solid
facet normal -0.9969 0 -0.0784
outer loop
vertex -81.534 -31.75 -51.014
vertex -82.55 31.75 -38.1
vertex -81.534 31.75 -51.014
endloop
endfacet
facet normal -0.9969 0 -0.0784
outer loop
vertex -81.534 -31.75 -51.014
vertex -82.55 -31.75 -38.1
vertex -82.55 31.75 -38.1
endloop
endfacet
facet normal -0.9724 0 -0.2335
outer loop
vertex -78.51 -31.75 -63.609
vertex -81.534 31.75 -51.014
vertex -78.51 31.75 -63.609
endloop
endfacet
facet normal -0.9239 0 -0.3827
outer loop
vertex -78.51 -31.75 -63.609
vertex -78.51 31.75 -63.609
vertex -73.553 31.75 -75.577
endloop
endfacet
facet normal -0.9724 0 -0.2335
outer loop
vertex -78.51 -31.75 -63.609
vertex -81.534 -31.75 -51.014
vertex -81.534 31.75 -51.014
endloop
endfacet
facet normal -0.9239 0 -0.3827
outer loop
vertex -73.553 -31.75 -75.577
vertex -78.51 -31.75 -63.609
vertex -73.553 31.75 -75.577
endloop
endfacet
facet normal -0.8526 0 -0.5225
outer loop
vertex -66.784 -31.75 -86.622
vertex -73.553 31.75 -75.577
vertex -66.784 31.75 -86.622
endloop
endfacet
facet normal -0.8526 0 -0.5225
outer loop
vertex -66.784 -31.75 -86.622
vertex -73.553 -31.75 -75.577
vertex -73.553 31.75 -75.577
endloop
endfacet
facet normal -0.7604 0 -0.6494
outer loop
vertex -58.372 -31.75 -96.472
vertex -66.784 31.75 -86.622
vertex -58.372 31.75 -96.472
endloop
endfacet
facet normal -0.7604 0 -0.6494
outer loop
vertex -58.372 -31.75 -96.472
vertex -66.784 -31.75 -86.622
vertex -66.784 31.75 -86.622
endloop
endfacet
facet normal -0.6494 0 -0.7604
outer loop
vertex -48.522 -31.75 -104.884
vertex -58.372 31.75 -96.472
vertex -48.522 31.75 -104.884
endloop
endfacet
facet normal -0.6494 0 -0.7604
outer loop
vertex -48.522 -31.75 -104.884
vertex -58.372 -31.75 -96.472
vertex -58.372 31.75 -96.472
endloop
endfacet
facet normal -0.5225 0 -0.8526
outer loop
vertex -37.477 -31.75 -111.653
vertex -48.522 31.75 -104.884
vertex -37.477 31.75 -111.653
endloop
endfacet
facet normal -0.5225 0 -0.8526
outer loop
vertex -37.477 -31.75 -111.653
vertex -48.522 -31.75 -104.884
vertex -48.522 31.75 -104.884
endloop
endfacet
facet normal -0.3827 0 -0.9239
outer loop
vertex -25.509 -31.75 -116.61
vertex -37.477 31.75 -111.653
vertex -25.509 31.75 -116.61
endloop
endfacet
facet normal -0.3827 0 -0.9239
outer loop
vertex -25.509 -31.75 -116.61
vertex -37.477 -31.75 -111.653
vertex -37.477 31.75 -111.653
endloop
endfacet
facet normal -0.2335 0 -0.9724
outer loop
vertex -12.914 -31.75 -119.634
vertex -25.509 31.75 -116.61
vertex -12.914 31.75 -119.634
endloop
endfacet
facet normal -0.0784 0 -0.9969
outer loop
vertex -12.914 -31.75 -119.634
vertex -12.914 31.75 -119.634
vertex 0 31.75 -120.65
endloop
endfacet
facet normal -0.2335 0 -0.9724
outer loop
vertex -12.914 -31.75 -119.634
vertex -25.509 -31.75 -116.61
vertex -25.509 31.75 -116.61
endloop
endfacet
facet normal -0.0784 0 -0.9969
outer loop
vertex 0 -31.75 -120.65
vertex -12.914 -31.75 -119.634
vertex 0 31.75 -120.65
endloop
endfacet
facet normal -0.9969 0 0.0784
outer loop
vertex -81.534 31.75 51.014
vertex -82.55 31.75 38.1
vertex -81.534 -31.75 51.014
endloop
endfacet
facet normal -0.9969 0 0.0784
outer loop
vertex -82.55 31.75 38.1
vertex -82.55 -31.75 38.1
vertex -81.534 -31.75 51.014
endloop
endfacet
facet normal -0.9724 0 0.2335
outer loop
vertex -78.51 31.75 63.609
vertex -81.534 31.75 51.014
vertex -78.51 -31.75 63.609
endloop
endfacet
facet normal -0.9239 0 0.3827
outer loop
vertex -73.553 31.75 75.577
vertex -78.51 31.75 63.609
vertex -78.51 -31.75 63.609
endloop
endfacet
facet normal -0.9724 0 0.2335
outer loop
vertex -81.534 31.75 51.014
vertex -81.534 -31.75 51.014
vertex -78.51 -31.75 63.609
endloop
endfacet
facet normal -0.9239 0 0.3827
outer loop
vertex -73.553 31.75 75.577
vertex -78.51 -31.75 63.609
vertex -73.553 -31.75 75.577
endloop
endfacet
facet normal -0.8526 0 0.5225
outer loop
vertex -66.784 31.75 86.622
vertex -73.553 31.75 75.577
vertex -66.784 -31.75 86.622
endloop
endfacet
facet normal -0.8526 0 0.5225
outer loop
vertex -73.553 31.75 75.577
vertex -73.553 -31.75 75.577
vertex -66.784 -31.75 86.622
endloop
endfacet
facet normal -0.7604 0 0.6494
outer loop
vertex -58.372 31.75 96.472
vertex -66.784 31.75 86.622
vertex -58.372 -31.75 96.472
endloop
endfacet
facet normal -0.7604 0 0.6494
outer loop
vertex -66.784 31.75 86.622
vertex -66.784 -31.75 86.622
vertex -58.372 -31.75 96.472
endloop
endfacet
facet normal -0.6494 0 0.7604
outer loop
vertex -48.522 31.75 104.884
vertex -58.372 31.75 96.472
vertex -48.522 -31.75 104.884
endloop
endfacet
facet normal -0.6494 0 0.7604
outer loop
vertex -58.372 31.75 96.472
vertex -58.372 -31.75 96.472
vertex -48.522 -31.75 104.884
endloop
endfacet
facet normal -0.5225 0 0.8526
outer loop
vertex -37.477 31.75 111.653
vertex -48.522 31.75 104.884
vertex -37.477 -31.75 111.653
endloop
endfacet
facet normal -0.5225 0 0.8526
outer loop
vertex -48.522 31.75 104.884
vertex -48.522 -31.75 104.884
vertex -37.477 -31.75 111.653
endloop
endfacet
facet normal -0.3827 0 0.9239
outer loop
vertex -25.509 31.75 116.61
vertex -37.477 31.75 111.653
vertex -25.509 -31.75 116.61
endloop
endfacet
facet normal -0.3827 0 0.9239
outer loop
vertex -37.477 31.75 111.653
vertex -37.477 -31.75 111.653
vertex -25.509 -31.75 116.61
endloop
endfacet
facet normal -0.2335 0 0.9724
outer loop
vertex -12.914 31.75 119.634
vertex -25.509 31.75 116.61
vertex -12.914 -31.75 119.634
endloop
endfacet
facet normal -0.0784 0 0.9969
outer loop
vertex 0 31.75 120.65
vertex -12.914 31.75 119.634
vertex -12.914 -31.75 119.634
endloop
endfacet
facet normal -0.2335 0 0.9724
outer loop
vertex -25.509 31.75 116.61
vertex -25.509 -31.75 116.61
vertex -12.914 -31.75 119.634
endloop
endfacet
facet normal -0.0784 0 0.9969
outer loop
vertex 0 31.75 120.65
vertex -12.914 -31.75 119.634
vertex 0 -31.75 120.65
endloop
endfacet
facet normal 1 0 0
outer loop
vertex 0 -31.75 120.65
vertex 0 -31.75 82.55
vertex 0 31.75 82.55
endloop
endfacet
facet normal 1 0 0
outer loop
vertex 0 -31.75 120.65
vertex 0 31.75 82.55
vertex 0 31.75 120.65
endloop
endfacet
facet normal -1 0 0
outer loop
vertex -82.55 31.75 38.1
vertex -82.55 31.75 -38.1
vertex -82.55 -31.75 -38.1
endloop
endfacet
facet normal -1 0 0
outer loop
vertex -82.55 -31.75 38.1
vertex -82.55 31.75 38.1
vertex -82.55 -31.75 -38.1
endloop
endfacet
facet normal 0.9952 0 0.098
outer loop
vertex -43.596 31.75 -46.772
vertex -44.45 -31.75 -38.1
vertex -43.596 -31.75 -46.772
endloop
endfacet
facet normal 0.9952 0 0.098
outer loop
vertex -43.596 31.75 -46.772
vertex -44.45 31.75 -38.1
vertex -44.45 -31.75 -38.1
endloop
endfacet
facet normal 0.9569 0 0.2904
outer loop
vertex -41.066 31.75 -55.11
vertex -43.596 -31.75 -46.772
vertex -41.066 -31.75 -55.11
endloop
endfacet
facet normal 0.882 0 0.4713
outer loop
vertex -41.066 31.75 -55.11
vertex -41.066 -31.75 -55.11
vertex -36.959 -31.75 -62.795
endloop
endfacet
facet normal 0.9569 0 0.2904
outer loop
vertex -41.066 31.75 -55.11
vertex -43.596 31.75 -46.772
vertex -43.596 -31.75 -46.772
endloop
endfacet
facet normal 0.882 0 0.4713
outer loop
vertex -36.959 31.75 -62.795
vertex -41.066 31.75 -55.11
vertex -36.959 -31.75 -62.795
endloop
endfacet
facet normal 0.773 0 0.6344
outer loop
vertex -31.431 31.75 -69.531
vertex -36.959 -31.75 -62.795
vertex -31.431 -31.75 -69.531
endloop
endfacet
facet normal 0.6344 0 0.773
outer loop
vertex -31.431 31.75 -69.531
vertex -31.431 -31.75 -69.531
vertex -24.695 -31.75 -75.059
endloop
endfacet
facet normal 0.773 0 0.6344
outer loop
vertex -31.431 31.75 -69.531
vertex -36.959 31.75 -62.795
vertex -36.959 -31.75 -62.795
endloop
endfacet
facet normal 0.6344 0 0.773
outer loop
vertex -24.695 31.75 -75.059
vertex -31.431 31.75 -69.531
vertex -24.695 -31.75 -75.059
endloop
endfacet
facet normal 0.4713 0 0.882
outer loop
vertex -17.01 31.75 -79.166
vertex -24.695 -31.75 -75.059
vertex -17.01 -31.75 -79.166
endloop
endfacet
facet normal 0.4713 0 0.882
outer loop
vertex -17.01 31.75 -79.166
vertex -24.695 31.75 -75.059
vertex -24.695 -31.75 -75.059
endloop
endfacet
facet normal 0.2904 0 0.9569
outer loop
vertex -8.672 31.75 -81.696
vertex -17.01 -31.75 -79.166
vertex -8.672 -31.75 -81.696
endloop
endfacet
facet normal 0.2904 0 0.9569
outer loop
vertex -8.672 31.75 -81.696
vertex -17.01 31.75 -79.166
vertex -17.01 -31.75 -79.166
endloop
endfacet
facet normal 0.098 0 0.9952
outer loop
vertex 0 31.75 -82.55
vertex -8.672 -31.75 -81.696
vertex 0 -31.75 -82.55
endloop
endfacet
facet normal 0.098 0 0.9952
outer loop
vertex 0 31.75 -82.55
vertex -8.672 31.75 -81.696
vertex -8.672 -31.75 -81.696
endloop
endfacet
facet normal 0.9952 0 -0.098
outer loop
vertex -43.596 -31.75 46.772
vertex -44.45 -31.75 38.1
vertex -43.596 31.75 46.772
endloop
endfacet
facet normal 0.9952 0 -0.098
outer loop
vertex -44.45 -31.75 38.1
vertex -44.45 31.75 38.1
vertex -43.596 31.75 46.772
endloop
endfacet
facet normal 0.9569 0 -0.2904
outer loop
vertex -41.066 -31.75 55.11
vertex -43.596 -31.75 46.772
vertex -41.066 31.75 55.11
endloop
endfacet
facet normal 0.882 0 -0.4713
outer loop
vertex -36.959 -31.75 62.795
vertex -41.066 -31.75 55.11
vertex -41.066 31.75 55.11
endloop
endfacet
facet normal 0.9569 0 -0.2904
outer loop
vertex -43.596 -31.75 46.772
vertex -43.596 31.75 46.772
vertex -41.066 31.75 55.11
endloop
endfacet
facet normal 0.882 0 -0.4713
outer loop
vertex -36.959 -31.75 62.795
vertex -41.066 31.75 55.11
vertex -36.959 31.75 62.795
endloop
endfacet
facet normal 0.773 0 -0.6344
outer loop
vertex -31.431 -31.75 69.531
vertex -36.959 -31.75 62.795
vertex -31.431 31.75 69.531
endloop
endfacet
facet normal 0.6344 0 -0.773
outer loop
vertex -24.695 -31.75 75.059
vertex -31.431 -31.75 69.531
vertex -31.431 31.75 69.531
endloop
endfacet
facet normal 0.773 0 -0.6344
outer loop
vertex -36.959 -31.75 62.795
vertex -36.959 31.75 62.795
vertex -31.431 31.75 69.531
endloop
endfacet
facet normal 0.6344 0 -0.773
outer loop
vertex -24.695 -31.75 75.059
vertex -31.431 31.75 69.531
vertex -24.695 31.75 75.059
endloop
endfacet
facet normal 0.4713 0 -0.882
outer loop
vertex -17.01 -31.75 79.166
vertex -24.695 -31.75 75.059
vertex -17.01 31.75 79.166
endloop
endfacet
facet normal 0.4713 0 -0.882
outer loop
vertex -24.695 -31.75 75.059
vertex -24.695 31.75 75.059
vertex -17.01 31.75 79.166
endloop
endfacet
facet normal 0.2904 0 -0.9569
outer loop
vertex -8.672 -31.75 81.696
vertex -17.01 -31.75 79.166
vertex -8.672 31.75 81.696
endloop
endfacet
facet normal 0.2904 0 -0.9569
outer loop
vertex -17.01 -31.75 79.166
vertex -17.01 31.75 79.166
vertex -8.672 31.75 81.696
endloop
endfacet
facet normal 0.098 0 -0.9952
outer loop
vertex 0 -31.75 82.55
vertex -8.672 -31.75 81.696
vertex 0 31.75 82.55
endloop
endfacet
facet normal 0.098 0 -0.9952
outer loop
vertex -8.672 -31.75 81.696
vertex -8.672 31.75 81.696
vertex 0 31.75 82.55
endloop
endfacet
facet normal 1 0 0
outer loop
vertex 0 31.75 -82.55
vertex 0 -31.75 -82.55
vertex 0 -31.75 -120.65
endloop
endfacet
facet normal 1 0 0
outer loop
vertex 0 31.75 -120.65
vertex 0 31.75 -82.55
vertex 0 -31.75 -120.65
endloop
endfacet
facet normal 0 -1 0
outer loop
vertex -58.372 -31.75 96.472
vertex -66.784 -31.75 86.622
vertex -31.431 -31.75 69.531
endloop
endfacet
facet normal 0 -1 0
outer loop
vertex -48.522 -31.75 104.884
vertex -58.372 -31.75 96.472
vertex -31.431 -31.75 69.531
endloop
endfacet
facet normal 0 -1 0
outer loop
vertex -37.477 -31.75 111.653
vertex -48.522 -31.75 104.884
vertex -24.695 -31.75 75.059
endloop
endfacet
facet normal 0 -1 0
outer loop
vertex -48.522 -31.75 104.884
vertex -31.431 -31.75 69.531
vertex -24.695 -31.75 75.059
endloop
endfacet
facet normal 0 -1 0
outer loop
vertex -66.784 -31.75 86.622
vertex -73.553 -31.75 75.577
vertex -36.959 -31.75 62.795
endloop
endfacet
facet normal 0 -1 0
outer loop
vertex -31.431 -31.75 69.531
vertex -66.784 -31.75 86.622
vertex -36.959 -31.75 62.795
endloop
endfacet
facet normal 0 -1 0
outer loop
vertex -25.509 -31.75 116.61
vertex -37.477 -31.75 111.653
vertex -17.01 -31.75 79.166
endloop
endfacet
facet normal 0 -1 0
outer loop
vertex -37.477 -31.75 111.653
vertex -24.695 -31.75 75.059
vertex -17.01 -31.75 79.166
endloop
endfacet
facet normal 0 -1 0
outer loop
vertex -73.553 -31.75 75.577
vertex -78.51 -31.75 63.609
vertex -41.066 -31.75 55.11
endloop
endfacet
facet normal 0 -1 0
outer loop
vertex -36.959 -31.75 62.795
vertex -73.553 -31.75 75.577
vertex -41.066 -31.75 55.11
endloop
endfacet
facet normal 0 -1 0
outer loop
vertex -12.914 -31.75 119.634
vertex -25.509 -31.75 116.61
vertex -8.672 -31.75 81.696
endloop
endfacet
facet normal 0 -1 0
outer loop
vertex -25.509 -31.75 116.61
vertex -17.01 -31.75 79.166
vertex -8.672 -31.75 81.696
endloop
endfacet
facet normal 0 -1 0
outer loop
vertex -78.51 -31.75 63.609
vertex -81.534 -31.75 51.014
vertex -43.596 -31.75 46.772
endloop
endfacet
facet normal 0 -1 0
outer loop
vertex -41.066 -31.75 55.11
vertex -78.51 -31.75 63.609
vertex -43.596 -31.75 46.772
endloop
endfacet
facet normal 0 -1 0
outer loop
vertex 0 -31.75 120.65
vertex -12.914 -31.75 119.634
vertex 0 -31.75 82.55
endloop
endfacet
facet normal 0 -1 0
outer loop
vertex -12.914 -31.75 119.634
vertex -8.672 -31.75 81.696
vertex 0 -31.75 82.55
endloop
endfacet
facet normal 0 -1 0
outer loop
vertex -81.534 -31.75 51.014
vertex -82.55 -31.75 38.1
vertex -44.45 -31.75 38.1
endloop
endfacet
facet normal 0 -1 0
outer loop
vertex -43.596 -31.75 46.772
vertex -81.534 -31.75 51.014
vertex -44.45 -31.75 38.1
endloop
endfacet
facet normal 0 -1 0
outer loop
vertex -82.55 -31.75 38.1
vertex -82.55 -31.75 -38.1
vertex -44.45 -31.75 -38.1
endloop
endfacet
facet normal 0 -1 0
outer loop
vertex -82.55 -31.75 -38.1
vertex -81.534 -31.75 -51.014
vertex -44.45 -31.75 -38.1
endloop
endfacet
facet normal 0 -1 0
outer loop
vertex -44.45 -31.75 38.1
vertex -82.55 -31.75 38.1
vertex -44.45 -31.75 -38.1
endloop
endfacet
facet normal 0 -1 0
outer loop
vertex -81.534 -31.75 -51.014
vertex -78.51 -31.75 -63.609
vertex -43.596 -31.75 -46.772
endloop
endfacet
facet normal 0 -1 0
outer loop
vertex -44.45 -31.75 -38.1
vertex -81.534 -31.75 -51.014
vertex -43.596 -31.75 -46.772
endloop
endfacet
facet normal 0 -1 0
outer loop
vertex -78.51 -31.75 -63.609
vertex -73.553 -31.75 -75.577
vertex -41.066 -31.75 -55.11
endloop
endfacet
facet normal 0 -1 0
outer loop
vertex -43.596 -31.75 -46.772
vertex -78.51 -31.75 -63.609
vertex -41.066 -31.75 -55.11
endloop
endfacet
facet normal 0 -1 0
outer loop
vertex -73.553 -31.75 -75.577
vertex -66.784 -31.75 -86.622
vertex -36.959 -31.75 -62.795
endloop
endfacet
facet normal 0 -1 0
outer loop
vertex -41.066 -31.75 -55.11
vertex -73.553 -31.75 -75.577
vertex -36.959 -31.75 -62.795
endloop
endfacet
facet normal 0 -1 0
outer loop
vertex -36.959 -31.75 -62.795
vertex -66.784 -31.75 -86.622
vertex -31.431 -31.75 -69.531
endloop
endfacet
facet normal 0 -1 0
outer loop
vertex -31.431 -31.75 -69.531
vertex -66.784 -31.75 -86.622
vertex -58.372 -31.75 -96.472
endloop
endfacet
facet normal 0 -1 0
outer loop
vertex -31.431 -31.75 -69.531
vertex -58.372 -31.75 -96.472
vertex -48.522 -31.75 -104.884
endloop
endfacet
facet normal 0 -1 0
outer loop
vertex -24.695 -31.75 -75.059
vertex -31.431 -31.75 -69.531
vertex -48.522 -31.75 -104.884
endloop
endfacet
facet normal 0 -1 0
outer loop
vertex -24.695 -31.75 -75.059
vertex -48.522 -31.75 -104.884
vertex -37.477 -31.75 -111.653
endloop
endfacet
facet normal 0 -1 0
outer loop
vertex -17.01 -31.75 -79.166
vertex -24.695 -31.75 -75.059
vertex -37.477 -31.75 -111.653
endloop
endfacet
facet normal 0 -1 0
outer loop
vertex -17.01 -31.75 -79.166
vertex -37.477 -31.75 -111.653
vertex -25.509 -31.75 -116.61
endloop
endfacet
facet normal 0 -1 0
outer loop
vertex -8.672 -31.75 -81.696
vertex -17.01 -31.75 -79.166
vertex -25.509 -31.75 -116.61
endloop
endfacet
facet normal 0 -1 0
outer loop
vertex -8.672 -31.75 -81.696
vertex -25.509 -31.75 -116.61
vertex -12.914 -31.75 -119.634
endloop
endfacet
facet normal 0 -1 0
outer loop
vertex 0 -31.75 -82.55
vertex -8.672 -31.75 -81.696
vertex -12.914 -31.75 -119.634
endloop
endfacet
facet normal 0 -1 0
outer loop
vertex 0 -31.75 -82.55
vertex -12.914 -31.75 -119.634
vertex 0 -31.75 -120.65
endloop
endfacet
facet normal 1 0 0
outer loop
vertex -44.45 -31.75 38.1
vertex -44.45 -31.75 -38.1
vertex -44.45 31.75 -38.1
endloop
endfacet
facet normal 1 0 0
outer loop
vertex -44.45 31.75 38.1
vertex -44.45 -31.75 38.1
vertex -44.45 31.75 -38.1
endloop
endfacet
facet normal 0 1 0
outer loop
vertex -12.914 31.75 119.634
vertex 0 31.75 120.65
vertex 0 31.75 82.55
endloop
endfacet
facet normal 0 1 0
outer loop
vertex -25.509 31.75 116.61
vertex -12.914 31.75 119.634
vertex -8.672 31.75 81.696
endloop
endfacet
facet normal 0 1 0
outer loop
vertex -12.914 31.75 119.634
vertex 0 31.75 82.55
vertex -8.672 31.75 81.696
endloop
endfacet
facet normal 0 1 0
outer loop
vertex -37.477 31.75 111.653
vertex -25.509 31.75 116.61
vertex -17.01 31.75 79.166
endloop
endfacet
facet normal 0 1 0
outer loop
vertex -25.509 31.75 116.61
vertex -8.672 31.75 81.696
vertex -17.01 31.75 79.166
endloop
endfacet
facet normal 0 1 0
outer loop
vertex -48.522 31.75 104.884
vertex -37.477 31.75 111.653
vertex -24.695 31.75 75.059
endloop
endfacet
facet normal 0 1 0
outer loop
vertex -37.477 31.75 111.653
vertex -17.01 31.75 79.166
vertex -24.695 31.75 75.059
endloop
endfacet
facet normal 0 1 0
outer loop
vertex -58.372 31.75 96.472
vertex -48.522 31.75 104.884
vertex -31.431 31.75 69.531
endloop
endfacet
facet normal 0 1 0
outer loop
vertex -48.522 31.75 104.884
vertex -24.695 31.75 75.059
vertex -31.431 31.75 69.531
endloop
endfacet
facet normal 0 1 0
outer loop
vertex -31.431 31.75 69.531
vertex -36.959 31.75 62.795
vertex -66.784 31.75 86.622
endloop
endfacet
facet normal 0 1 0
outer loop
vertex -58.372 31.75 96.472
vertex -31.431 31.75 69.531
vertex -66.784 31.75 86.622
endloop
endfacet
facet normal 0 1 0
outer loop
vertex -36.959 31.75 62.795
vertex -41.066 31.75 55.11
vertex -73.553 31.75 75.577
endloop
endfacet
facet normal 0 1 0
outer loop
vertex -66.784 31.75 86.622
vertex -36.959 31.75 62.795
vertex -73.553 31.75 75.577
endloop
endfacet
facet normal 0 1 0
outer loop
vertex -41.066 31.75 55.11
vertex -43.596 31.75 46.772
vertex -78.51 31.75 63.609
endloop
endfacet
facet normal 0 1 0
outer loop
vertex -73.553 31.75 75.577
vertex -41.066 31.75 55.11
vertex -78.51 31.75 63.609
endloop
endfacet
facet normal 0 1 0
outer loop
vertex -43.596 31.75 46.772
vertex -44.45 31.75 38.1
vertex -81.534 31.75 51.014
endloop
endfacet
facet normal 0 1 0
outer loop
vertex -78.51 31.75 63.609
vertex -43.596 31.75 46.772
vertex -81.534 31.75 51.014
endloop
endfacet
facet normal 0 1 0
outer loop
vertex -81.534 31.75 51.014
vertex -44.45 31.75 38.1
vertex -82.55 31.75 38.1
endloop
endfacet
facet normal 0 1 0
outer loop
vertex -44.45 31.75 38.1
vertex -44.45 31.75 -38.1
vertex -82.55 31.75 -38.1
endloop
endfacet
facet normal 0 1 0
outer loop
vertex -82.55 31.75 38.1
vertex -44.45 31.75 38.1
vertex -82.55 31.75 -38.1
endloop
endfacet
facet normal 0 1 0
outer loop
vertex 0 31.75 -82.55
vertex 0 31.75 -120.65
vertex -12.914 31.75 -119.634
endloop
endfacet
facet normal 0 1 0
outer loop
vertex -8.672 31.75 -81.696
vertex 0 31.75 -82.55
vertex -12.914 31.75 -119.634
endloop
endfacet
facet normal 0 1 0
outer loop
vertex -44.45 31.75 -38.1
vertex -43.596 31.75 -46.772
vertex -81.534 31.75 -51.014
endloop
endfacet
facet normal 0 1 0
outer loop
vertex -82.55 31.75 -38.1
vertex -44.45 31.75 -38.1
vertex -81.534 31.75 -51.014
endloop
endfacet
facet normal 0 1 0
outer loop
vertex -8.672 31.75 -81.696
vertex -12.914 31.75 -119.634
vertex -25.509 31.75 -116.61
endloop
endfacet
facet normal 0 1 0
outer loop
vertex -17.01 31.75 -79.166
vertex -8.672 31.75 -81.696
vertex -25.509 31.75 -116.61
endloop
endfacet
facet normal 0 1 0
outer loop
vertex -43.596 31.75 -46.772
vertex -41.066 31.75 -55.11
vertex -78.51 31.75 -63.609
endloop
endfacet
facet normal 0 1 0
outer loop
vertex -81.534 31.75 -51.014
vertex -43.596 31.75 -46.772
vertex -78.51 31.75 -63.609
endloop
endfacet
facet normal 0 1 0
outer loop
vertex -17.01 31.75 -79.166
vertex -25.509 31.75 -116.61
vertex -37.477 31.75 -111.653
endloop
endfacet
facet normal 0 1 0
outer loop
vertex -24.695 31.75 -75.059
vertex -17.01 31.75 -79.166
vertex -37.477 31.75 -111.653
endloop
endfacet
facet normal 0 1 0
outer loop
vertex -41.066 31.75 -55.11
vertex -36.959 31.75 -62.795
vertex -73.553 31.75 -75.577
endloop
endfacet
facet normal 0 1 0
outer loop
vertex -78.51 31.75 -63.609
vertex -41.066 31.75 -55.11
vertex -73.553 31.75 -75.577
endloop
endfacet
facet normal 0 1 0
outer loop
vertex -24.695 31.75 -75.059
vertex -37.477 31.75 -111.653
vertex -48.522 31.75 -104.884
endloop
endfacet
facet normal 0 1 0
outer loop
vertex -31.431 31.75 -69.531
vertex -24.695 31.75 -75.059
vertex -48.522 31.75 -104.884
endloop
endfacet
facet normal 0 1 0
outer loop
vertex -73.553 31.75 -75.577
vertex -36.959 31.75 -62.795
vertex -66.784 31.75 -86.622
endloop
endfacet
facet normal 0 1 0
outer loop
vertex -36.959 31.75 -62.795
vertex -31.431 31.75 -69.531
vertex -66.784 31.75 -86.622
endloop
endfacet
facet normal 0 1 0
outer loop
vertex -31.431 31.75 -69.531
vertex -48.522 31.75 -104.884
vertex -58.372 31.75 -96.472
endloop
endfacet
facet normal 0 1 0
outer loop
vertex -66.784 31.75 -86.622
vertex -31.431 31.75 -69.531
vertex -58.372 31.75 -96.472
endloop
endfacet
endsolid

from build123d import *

# Parameters (mm, degrees)
F1_W = 38.1
F1_H = 63.5


with BuildPart() as f2:
    # F2: sweep along a path in F0
    with BuildLine(Plane.XZ) as f2_path:
        Line((-63.5, 0), (-63.5, 38.1))
        ThreePointArc((-63.5, 38.1), (-44.901281, 83.001281), (0, 101.6))
    # F1 (on Top) → F2 (sweep)
    with BuildSketch(Plane.XY):
        with Locations((-63.5, 0)):
            Rectangle(F1_W, F1_H)
    sweep(path=f2_path.line)

    # F3: sweep along a path in F0
    with BuildLine(Plane.XZ) as f3_path:
        Line((-63.5, 0), (-63.5, -38.1))
        ThreePointArc((-63.5, -38.1), (-44.901281, -83.001281), (0, -101.6))
    # F1 (on Top) → F3 (sweep)
    with BuildSketch(Plane.XY):
        with Locations((-63.5, 0)):
            Rectangle(F1_W, F1_H)
    sweep(path=f3_path.line)


solid = f2.part
